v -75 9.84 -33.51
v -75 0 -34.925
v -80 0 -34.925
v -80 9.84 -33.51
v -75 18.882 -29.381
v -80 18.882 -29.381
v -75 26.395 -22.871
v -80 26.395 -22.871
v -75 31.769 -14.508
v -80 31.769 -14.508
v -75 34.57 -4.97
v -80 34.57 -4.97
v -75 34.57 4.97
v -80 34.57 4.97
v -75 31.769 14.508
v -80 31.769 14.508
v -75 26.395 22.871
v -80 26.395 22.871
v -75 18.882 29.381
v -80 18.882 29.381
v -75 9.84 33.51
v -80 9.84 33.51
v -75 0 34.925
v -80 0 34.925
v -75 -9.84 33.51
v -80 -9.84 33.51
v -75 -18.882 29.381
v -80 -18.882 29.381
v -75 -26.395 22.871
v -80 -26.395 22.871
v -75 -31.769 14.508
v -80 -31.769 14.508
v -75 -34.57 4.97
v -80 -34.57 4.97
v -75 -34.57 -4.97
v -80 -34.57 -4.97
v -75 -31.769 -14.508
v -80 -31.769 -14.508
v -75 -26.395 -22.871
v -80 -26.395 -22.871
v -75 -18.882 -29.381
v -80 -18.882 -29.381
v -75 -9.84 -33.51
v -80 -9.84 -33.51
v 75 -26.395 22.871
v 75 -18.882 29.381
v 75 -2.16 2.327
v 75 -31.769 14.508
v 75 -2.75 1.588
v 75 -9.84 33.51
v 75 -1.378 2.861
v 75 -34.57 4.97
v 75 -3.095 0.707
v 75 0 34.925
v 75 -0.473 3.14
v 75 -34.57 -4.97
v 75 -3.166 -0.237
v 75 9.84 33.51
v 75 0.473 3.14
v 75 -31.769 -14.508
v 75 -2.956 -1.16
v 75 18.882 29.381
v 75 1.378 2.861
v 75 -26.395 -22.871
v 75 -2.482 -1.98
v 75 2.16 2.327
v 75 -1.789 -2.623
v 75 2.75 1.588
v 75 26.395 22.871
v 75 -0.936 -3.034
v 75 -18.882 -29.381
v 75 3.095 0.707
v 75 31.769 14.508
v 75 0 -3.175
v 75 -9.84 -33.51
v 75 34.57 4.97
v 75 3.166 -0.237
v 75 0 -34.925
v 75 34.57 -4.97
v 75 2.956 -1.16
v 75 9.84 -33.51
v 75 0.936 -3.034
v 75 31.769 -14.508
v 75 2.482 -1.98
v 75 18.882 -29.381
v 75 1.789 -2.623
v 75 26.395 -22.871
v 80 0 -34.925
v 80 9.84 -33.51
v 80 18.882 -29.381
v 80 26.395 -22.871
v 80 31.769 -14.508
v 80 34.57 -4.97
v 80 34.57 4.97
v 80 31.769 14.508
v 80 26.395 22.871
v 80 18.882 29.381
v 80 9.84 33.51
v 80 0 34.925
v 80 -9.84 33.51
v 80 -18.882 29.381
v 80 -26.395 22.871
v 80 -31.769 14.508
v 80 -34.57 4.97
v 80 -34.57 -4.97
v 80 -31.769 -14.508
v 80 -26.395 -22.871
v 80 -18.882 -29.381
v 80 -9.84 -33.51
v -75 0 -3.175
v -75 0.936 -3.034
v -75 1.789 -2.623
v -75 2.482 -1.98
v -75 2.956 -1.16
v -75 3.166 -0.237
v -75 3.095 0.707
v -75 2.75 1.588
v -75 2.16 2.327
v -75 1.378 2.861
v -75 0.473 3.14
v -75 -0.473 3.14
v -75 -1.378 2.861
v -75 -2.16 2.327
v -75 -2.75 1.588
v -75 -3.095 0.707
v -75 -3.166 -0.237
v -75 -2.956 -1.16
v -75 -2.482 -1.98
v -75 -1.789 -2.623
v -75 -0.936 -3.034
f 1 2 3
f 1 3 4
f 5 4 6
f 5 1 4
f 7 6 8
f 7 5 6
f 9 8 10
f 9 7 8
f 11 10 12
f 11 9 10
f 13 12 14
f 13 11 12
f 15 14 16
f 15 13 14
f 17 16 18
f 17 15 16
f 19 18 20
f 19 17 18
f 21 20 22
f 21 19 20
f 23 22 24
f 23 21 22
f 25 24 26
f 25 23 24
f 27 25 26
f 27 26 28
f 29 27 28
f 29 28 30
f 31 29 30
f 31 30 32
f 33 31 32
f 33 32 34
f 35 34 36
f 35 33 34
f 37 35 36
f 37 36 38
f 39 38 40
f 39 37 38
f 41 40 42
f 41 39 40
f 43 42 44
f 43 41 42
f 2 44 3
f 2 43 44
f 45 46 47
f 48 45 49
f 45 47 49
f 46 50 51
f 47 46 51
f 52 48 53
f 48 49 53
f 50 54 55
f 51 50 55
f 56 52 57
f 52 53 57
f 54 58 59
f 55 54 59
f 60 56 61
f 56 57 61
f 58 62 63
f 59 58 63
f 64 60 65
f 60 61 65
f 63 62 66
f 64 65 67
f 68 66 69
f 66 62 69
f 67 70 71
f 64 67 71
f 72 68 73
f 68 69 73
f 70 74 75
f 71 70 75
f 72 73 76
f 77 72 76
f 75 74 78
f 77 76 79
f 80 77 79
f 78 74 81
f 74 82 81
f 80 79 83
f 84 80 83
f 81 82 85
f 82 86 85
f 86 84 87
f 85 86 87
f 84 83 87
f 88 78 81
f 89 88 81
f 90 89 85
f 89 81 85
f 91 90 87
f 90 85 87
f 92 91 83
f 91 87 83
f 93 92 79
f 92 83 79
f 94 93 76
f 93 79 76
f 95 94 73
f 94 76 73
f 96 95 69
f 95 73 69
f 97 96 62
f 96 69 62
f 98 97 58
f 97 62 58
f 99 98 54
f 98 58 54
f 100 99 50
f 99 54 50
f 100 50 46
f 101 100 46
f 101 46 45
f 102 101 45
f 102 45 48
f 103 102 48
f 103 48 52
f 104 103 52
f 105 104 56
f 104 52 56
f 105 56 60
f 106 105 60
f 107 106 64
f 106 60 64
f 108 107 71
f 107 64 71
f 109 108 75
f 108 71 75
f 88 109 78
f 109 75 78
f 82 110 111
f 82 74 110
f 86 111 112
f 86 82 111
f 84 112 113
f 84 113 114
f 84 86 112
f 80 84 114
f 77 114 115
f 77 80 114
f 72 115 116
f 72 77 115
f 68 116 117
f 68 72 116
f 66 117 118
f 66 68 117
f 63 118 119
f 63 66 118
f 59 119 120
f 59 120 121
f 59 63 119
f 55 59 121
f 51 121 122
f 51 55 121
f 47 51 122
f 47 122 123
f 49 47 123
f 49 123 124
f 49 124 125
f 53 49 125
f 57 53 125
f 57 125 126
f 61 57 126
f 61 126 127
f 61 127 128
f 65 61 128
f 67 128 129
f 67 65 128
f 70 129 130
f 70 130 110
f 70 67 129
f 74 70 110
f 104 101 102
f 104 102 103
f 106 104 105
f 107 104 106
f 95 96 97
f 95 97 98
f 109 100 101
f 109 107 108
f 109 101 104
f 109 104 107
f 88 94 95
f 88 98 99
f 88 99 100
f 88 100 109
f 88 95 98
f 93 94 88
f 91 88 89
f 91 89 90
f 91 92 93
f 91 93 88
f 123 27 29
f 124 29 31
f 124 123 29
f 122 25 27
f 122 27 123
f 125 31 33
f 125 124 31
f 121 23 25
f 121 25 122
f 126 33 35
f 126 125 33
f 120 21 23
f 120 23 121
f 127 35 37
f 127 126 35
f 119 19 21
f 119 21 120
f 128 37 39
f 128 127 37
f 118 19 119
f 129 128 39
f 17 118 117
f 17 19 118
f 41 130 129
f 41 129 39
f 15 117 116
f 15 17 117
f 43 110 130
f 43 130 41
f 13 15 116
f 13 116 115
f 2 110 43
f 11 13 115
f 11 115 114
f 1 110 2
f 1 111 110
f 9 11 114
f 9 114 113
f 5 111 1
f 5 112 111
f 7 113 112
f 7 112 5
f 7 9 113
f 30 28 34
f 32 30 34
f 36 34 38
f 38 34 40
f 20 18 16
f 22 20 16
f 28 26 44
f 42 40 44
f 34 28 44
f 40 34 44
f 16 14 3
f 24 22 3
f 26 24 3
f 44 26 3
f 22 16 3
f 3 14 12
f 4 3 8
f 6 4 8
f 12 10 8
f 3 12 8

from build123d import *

# Parameters (mm, degrees)
SKETCH1_R           = 3.175
BOSS_EXTRUDE1_DEPTH = 75
SKETCH2_R           = 34.925
BOSS_EXTRUDE2_DEPTH = 5


with BuildPart() as part:
    # Sketch1 → Boss-Extrude1 (new body, symmetric)
    with BuildSketch(Plane(origin=(0, 0, 0), x_dir=(0, 0, -1), z_dir=(1, 0, 0))):
        Circle(SKETCH1_R)
    extrude(amount=BOSS_EXTRUDE1_DEPTH, both=True)

    # Sketch2 → Boss-Extrude2 (add)
    with BuildSketch(Plane(origin=(75, 0, 0), x_dir=(0, 0, -1), z_dir=(1, 0, 0))):
        Circle(SKETCH2_R)
    boss_extrude2 = extrude(amount=BOSS_EXTRUDE2_DEPTH)

    # Mirror1: Boss-Extrude2 across plane
    add(boss_extrude2.mirror(Plane(origin=(0, 0, 0), x_dir=(0, 0, 1), z_dir=(1, 0, 0))))


solid = part.part
